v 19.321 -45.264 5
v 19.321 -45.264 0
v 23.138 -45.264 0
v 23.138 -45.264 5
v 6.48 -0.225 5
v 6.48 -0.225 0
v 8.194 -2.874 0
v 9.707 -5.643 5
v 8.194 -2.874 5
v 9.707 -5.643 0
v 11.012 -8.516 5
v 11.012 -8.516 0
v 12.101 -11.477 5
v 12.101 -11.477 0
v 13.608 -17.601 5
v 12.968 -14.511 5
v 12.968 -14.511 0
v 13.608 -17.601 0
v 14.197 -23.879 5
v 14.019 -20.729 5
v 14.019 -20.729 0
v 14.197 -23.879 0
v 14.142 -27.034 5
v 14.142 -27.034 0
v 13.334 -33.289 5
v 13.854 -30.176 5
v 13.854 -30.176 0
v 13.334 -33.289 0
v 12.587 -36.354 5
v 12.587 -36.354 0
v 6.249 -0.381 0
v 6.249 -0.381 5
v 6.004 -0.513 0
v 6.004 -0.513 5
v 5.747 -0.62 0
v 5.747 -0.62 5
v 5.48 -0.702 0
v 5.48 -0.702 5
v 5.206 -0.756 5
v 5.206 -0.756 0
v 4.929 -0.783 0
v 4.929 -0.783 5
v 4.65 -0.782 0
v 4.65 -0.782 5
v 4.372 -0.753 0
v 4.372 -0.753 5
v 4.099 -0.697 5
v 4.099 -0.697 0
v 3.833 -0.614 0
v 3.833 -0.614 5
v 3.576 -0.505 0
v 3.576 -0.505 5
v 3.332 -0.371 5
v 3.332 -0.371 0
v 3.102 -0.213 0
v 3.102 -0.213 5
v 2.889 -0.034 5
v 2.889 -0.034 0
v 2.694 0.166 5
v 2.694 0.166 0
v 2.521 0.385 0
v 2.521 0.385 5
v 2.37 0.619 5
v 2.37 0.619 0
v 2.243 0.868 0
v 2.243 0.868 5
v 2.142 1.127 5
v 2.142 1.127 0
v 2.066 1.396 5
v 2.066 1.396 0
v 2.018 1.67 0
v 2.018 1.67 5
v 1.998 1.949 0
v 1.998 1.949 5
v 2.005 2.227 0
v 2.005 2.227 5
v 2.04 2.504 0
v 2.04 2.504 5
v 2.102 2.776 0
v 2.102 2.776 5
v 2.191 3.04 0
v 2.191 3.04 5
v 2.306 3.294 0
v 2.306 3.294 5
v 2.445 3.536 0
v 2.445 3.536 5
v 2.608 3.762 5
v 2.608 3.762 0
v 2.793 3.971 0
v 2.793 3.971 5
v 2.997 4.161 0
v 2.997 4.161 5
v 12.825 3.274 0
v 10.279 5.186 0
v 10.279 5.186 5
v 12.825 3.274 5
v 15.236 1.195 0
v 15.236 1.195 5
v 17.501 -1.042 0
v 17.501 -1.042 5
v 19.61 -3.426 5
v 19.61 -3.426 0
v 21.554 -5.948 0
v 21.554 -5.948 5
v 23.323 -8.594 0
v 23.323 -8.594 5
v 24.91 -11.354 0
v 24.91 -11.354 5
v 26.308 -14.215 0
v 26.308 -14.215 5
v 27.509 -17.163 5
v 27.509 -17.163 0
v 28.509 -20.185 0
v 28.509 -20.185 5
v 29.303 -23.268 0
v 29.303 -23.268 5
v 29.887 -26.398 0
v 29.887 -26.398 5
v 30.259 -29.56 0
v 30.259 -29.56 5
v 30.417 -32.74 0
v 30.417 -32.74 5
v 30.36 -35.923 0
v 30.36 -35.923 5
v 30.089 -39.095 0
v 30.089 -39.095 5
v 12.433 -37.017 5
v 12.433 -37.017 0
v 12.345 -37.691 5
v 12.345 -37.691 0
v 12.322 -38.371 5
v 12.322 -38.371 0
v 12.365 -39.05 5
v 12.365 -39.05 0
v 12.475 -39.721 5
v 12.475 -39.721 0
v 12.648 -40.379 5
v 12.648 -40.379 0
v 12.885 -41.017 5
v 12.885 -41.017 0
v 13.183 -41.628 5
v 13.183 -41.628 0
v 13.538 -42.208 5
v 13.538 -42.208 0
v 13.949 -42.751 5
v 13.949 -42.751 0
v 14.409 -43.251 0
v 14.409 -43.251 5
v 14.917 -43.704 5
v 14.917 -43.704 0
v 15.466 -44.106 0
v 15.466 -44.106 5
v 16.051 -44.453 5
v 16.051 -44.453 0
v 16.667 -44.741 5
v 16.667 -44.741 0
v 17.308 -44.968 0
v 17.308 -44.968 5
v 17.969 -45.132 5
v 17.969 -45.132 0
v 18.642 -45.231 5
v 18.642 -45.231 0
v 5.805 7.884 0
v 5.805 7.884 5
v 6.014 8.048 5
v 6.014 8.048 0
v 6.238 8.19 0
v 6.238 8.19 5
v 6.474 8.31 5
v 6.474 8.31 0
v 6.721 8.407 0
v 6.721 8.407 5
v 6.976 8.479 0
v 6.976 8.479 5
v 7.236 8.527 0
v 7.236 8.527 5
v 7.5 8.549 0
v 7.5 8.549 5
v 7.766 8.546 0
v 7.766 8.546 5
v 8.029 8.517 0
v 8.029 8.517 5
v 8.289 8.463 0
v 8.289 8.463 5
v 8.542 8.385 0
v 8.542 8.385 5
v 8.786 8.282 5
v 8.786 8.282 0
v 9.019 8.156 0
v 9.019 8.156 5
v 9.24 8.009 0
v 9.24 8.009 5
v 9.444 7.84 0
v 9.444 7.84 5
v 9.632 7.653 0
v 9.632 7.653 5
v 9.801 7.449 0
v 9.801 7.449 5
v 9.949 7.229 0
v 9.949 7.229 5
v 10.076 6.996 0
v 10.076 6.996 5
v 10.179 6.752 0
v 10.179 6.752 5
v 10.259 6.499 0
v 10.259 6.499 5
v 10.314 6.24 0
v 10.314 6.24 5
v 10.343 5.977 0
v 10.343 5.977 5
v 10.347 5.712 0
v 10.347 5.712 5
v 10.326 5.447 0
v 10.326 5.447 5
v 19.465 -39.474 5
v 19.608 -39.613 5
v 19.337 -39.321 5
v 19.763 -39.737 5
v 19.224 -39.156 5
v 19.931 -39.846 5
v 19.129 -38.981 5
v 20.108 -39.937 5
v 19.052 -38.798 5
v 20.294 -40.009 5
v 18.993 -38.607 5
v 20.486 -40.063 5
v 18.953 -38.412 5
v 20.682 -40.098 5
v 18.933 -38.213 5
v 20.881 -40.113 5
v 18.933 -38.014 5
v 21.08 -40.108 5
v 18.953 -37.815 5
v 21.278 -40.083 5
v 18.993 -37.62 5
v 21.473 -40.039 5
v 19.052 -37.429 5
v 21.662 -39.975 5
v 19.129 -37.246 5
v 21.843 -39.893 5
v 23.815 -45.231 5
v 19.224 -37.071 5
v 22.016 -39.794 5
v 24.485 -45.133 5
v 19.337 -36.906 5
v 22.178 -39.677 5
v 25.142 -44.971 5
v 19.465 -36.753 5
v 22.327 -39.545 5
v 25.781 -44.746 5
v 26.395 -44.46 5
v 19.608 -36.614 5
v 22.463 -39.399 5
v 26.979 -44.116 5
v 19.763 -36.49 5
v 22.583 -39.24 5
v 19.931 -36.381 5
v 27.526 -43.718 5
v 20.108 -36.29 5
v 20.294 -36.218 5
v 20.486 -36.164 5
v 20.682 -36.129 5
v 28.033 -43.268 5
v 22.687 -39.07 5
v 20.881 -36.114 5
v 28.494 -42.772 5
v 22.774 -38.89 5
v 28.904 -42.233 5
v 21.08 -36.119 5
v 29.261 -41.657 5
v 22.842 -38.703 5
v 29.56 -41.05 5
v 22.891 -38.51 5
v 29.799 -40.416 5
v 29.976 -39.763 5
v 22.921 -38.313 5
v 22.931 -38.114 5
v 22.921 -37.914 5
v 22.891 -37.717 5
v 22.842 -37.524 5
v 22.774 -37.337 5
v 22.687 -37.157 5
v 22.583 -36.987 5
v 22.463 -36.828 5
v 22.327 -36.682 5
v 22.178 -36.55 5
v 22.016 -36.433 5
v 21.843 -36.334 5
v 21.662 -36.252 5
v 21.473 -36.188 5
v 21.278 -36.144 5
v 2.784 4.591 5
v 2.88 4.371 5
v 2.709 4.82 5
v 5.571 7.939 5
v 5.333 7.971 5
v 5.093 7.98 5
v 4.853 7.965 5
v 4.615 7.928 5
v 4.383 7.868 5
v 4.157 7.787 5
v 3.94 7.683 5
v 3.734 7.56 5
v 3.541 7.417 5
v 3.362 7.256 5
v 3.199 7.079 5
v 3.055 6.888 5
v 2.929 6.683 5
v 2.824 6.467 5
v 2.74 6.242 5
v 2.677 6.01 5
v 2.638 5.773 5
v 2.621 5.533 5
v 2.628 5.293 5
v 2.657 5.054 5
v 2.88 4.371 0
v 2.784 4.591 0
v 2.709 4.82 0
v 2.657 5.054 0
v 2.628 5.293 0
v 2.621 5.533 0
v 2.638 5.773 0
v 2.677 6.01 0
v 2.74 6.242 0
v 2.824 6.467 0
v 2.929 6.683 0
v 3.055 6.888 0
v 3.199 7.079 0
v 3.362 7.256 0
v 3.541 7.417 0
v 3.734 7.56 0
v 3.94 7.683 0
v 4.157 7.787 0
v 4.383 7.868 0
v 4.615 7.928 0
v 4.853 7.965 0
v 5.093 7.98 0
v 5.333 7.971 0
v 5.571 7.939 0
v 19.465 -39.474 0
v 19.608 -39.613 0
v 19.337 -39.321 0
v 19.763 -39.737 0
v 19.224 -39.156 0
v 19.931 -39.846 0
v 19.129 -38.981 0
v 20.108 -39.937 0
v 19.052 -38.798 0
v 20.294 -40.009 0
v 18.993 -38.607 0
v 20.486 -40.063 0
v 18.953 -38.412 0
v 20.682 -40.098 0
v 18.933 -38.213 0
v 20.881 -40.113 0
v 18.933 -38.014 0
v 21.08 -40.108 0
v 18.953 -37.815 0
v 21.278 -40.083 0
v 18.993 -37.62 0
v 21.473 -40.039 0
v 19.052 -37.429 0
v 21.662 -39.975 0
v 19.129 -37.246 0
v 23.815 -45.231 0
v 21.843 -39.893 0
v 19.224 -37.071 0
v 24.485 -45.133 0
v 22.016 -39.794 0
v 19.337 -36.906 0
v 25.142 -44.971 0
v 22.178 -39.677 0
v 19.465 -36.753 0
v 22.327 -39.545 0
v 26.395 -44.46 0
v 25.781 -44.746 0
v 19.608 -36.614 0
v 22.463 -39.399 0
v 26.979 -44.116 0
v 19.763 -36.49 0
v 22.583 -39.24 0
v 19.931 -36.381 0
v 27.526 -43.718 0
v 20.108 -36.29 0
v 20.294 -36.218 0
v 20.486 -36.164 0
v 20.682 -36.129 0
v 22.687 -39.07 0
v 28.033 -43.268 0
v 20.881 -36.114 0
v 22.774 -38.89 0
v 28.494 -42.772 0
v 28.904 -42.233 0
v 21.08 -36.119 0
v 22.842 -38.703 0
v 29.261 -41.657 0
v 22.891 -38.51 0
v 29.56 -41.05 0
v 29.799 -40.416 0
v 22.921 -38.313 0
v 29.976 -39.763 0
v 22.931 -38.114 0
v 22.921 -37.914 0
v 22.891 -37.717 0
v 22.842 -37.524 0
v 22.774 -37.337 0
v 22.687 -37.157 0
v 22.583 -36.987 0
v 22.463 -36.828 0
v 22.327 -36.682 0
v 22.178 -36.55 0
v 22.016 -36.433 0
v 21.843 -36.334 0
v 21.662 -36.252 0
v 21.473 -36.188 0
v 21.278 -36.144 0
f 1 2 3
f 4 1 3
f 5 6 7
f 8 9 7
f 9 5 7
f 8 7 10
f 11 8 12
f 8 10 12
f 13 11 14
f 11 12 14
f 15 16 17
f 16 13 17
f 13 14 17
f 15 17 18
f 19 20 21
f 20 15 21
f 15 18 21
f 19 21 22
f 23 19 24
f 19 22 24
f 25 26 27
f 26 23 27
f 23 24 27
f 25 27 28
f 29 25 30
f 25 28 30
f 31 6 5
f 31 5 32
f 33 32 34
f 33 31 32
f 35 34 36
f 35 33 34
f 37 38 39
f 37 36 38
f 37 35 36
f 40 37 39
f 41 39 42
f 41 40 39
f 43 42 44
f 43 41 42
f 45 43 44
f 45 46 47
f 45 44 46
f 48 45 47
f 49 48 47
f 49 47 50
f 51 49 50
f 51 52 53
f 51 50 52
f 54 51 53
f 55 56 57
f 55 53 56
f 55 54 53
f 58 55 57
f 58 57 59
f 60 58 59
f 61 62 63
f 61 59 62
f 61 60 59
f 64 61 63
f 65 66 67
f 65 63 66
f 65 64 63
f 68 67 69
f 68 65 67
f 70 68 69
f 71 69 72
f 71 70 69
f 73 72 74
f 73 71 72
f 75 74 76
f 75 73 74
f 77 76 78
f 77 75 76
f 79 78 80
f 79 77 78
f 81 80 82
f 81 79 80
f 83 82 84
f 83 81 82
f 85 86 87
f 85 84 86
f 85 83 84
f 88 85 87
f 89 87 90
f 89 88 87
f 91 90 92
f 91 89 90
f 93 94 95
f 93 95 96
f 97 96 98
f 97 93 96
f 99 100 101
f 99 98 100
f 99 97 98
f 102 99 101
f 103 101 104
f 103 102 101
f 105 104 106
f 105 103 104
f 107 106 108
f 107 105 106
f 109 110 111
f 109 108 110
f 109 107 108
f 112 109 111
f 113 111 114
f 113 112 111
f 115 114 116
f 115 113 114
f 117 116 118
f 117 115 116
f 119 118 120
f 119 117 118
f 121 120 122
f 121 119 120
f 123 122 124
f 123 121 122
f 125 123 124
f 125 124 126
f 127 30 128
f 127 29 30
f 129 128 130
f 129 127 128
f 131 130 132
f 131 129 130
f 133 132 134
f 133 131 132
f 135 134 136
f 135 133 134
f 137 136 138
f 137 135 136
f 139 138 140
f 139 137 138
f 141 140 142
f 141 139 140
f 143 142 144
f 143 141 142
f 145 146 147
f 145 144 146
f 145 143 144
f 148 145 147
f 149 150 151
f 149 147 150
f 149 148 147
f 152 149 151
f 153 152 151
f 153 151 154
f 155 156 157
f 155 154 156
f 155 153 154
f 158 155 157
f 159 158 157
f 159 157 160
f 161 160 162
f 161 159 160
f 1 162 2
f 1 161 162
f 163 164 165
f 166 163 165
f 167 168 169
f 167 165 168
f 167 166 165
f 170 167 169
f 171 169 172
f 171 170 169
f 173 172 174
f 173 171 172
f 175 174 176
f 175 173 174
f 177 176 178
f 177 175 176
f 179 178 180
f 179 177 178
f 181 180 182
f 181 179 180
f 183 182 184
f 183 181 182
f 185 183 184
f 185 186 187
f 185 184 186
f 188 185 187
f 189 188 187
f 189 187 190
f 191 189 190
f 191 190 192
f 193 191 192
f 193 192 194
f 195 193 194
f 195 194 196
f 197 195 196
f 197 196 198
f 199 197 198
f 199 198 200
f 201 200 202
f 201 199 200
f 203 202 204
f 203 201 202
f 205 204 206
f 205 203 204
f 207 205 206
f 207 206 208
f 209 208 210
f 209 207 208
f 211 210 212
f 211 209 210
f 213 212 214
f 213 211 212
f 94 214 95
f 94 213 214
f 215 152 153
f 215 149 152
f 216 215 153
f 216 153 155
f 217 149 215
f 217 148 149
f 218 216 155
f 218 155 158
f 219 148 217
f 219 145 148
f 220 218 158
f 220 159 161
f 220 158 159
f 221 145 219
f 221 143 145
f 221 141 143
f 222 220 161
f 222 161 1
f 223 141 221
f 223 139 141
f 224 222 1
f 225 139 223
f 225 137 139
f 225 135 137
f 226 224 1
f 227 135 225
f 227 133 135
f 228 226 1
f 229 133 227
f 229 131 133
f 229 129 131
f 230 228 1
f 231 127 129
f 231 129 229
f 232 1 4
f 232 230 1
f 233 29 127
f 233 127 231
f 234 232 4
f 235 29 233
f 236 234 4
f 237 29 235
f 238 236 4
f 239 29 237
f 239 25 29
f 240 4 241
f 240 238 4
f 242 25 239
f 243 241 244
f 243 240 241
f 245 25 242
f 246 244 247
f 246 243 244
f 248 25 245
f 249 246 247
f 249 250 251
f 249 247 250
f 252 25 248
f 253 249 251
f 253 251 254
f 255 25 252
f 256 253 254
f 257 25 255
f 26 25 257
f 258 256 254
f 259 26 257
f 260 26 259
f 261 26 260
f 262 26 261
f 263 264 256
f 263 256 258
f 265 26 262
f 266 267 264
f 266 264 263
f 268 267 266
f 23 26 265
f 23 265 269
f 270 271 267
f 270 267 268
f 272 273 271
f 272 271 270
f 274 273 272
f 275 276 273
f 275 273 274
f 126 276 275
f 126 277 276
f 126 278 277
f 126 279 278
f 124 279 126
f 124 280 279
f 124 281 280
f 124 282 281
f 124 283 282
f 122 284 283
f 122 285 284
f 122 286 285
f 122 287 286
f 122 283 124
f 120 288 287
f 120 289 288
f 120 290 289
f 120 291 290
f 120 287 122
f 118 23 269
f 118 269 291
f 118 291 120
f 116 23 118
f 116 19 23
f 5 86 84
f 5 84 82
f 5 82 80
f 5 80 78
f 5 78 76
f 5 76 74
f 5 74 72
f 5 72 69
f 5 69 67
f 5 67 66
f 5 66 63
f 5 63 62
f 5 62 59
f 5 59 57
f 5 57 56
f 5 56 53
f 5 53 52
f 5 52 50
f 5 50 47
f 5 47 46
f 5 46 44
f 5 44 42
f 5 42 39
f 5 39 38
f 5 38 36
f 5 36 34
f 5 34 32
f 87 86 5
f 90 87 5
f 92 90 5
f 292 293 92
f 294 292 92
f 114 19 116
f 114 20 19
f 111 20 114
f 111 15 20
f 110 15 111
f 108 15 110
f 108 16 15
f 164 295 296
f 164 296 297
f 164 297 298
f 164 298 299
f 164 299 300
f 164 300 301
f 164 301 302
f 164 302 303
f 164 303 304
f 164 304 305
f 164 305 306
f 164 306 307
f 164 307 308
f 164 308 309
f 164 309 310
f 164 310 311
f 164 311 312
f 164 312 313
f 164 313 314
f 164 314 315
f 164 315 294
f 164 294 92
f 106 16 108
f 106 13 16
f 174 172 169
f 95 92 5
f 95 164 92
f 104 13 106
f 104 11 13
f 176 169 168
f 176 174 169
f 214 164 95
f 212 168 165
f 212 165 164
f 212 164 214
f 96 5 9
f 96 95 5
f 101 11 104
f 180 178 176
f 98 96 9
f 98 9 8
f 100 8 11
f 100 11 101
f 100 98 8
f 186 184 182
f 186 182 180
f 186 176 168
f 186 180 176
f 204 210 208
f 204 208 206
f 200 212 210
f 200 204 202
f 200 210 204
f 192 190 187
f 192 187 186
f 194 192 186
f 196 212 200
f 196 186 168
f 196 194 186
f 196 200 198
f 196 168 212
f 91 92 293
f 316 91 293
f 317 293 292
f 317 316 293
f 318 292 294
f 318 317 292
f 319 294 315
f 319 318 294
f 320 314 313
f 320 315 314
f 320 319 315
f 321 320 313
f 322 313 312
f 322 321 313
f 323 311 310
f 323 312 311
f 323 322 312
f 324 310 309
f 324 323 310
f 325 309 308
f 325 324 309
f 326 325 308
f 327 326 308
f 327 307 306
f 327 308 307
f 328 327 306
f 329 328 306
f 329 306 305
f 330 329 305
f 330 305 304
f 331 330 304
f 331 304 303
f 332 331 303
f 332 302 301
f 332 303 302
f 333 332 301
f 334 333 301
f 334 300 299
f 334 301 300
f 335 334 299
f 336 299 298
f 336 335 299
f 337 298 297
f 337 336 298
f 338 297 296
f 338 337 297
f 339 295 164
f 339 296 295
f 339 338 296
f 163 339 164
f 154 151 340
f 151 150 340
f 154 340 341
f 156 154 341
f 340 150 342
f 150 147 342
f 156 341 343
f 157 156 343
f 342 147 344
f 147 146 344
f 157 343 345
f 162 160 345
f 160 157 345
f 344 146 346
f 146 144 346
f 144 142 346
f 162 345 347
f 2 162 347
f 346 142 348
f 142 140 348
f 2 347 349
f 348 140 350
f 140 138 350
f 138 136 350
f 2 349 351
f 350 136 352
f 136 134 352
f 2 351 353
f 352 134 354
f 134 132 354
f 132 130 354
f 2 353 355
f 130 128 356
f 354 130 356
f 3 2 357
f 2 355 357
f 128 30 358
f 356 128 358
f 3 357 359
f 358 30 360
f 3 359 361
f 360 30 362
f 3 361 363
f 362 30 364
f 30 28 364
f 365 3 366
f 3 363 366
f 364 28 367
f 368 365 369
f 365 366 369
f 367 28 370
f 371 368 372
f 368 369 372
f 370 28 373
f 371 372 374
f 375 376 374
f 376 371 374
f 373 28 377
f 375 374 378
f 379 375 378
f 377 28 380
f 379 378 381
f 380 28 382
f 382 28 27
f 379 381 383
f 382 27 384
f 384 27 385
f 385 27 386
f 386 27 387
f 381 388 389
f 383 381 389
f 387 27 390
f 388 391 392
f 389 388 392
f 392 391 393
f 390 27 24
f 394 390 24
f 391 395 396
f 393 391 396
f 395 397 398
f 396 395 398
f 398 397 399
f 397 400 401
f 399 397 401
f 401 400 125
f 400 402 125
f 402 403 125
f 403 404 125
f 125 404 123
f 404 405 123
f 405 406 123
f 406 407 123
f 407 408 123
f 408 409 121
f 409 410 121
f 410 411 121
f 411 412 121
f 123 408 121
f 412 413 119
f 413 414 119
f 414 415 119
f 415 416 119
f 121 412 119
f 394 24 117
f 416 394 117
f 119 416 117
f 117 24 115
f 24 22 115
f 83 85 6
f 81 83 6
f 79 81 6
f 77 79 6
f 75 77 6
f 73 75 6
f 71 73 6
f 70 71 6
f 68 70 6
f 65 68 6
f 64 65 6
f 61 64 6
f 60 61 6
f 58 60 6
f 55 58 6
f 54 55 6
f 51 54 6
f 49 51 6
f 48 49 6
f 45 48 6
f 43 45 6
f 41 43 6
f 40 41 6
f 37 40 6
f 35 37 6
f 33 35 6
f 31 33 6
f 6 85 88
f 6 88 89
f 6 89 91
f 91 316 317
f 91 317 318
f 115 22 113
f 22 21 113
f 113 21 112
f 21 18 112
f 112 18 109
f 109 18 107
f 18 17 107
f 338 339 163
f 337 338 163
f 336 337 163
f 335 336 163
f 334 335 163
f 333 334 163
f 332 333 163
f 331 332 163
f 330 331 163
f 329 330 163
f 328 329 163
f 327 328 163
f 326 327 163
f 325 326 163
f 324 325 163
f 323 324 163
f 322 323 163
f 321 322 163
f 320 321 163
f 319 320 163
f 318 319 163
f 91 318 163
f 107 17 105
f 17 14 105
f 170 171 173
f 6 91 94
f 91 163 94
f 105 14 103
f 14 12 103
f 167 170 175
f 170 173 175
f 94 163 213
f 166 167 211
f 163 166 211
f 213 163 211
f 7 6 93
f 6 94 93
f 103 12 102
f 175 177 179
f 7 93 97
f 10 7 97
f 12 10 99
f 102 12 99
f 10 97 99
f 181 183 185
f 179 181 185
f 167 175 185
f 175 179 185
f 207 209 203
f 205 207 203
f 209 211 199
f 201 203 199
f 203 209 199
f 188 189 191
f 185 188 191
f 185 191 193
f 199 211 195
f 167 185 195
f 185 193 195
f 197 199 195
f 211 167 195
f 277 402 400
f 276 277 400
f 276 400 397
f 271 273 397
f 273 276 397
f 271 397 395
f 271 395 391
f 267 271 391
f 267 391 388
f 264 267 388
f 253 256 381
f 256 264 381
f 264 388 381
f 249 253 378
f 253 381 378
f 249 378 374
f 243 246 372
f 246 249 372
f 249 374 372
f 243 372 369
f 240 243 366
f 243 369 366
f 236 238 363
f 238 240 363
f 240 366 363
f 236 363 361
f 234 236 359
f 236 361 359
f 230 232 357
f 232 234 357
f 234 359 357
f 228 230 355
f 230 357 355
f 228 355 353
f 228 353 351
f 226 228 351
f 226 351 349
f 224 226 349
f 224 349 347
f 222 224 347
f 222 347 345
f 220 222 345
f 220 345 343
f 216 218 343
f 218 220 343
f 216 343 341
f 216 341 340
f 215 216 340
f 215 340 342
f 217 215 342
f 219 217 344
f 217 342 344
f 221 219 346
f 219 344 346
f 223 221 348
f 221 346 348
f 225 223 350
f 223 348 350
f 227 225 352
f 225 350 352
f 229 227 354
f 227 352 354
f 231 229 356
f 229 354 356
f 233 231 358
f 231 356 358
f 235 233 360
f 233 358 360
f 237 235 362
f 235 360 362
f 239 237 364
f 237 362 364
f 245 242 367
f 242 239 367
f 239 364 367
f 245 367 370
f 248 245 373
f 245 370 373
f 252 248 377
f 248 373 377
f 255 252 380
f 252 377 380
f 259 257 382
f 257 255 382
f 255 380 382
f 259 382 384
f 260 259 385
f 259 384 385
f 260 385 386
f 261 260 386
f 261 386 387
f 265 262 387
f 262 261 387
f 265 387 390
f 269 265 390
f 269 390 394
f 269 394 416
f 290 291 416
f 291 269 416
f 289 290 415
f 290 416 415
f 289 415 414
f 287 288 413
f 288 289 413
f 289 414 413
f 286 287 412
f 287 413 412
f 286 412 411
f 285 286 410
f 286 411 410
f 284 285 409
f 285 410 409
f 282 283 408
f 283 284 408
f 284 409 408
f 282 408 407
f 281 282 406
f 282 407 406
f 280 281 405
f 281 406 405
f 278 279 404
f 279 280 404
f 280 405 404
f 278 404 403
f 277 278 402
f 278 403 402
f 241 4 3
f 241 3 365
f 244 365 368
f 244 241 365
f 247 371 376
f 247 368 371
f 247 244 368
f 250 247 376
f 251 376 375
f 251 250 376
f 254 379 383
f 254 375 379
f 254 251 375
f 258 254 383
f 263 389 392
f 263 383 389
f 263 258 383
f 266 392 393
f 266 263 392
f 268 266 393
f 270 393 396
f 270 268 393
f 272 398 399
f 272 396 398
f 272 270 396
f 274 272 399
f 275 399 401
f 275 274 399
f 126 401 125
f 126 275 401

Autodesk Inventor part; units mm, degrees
ref_plane "YZ Plane" through (0, 0, 0) normal (1, 0, 0) x (0, 1, 0)
ref_plane "XZ Plane" through (0, 0, 0) normal (0, 1, 0) x (-1, 0, 0)
ref_plane "XY Plane" through (0, 0, 0) normal (0, 0, 1) x (1, 0, 0)
sketch "Sketch1" plane through (0, 0, 0) normal (0, 0, 1) x (1, 0, 0)
  arc A0 (6.3455, 7.6592) -> (2.9969, 4.161) centre (5.1207, 5.4798) ccw
  arc A1 (28.9309, -45.2636) -> (10.279, 5.1864) centre (-16.779, -33.4901) ccw
  arc A2 (8.9309, -45.2636) -> (6.4804, -0.2246) centre (-28.4708, -24.7125) ccw
  line L0 (8.9309, -45.2636) -> (28.9309, -45.2636)
  arc A3 (2.9969, 4.161) -> (6.4804, -0.2246) centre (4.7985, 2.0157) ccw
  arc A4 (10.279, 5.1864) -> (5.805, 7.8843) centre (7.5999, 5.8022) ccw
  circle A5 centre (20.9309, -38.1135) radius 2
  point P0 (0, 0)
  dimension "d25" = 2.5
  dimension "d32" = 20
  dimension "d50" = 7.1502
  dimension "d51" = 8
extrude "Extrusion4" add sketch "Sketch1" along normal blind 5
fillet "Fillet3" radius 7 2 edges at (8.9309, -45.2636, 2.5) (28.9309, -45.2636, 2.5)
properties part number "mavac_ruka I guesss"
